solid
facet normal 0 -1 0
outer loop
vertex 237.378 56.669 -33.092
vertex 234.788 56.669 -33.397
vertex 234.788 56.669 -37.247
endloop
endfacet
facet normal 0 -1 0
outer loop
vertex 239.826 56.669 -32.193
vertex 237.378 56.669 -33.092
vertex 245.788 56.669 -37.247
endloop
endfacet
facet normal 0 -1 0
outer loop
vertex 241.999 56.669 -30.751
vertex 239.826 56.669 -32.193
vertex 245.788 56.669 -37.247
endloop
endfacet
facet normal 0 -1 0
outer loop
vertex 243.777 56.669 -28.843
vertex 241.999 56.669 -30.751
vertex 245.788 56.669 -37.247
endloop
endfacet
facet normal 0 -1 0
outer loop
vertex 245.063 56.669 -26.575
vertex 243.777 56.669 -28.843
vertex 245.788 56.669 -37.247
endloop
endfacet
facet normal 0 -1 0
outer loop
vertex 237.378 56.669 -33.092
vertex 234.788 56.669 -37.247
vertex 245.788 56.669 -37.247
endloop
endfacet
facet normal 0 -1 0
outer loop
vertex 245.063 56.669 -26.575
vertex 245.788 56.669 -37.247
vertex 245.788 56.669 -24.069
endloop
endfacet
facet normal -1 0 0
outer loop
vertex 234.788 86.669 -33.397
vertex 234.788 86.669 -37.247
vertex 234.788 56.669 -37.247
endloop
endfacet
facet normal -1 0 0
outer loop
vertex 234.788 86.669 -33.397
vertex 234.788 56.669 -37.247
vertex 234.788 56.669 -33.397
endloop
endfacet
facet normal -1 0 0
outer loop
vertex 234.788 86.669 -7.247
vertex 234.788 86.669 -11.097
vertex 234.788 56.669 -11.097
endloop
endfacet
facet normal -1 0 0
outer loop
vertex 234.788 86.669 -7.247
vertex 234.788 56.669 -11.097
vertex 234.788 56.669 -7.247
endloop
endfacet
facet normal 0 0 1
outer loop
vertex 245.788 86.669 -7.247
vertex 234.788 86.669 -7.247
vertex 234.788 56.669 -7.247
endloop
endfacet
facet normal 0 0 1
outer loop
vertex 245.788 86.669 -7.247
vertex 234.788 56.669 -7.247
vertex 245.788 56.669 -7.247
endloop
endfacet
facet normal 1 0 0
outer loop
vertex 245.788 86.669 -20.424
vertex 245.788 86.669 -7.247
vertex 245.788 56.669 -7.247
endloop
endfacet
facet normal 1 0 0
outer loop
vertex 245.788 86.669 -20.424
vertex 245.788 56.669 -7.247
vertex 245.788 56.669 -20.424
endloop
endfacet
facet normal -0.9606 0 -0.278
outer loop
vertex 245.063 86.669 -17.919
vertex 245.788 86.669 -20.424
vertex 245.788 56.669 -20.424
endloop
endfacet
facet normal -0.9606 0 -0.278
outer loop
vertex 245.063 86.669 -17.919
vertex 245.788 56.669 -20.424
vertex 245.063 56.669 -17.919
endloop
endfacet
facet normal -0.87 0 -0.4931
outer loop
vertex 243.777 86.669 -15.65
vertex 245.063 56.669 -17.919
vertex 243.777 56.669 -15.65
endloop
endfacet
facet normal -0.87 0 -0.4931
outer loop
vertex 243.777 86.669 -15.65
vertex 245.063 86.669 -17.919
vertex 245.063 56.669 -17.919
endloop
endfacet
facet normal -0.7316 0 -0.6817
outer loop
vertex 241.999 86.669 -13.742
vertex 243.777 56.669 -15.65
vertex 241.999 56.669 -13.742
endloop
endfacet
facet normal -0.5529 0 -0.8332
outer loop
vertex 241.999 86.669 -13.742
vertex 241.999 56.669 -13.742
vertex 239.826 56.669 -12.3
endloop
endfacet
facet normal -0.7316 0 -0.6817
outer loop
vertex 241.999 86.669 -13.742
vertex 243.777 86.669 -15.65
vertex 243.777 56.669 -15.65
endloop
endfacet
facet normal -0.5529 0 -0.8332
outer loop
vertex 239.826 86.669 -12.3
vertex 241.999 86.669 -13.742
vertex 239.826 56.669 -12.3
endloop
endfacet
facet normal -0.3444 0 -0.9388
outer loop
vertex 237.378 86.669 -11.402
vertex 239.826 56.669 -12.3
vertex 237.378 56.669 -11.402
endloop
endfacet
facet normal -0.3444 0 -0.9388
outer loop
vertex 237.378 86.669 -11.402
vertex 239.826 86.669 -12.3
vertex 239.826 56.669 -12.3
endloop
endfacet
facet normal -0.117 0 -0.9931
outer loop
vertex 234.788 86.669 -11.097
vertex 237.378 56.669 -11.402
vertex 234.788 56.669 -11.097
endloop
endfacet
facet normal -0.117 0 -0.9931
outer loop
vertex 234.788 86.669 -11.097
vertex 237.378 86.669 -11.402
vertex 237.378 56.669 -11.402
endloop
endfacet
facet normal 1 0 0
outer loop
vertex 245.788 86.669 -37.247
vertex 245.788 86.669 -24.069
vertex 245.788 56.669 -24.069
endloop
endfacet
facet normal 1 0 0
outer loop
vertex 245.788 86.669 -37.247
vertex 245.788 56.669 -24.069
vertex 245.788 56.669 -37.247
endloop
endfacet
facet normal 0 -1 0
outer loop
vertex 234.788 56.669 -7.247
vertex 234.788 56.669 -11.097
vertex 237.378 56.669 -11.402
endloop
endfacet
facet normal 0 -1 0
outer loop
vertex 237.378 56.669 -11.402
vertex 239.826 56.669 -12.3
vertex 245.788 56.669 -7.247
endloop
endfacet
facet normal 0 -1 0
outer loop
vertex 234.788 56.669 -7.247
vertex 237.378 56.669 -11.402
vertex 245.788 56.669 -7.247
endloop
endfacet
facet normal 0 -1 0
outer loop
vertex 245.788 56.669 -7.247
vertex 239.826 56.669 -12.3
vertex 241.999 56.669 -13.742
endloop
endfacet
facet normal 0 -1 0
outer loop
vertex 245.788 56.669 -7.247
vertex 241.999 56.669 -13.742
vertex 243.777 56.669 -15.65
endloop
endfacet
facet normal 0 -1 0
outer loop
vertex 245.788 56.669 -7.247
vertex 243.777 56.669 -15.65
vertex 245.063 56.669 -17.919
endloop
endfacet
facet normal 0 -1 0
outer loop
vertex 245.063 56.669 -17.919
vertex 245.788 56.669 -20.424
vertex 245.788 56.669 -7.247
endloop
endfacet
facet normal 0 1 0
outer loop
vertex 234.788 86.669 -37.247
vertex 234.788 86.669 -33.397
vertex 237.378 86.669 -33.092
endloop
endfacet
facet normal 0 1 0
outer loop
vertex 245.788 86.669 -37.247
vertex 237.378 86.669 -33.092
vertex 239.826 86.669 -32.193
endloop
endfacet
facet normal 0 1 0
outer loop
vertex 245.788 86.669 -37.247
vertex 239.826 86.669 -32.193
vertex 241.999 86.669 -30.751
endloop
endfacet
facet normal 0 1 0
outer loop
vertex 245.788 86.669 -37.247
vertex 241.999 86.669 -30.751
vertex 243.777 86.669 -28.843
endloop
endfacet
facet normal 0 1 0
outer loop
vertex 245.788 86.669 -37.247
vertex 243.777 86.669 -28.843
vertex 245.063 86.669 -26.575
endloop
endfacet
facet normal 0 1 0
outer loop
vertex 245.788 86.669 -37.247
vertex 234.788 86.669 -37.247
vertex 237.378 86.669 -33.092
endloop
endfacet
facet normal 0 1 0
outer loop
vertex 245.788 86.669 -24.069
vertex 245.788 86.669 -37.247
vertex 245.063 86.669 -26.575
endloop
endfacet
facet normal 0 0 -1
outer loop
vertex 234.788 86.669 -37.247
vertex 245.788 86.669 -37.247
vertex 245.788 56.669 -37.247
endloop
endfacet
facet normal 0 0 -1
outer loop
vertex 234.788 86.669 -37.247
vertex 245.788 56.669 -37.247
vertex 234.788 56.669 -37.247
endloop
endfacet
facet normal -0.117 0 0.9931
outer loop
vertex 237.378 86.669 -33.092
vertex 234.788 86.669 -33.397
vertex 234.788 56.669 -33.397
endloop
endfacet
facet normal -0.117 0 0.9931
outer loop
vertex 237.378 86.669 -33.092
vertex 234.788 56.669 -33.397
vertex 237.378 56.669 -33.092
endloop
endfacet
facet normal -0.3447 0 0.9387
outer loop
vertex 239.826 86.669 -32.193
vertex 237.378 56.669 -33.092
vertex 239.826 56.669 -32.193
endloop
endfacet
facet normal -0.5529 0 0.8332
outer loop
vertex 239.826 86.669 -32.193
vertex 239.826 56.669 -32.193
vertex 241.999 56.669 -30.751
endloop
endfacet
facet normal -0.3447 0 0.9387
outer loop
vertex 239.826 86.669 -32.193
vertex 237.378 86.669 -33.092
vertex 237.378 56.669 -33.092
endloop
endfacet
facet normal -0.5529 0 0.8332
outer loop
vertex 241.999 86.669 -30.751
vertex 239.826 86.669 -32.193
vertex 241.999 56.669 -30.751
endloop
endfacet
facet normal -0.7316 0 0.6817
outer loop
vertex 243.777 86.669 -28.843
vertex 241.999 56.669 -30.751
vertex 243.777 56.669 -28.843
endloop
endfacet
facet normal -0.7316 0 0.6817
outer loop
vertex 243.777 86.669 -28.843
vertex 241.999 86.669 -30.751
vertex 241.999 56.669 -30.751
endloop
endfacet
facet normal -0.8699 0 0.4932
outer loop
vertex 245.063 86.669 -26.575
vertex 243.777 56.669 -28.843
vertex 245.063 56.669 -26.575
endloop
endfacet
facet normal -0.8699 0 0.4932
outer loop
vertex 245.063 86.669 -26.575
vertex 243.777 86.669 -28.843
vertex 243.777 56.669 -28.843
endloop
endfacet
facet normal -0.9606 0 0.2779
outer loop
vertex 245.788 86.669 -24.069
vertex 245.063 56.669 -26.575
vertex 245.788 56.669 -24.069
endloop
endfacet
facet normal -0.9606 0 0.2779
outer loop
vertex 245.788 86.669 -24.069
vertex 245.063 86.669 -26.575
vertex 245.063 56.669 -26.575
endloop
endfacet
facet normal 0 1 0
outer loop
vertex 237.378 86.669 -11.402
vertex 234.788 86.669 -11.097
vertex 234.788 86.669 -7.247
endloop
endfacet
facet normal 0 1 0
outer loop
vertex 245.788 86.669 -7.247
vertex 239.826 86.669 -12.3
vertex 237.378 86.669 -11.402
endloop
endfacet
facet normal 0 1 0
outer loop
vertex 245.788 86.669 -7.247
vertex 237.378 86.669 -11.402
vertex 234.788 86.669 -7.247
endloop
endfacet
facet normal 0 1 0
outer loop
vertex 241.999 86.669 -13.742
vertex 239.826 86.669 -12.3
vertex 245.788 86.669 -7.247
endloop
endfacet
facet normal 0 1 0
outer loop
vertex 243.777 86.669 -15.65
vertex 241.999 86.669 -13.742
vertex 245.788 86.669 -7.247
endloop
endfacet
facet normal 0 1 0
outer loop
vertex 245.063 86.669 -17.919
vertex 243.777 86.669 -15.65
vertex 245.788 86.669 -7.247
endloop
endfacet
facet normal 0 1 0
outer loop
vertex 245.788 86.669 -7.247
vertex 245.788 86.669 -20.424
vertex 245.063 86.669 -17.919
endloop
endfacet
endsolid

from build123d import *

# Parameters (mm, degrees)
BOSS_EXTRUDE1_DEPTH   = 30
BOSS_EXTRUDE1_2_DEPTH = 30


with BuildPart() as part:
    # Sketch1 → Boss-Extrude1 (new body)
    with BuildSketch(Plane(origin=(0, 86.669072122, 0), x_dir=(1, 0, 0), z_dir=(0, 1, 0))):
        with BuildLine():
            Line((234.787548473, 7.246684875), (245.787548473, 7.246684875))
            Line((245.787548473, 7.246684875), (245.787548473, 11.246684875))
            Line((245.787548473, 11.246684875), (245.787548473, 20.423912262))
            ThreePointArc((245.787548473, 20.423912262), (241.99860198, 13.742379652), (234.787548473, 11.096684875))
            Line((234.787548473, 11.096684875), (234.787548473, 7.246684875))
        make_face()
    extrude(amount=-BOSS_EXTRUDE1_DEPTH)


with BuildPart() as body_2:
    # Sketch1 → Boss-Extrude1 2 (new body)
    with BuildSketch(Plane(origin=(0, 86.669072122, 0), x_dir=(1, 0, 0), z_dir=(0, 1, 0))):
        with BuildLine():
            Line((234.787548473, 37.246684875), (234.787548473, 33.396684875))
            ThreePointArc((234.787548473, 33.396684875), (241.99860198, 30.750990098), (245.787548473, 24.069457488))
            Line((245.787548473, 24.069457488), (245.787548473, 33.246684875))
            Line((245.787548473, 33.246684875), (245.787548473, 37.246684875))
            Line((245.787548473, 37.246684875), (234.787548473, 37.246684875))
        make_face()
    extrude(amount=-BOSS_EXTRUDE1_2_DEPTH)


solid = Compound([part.part, body_2.part])
